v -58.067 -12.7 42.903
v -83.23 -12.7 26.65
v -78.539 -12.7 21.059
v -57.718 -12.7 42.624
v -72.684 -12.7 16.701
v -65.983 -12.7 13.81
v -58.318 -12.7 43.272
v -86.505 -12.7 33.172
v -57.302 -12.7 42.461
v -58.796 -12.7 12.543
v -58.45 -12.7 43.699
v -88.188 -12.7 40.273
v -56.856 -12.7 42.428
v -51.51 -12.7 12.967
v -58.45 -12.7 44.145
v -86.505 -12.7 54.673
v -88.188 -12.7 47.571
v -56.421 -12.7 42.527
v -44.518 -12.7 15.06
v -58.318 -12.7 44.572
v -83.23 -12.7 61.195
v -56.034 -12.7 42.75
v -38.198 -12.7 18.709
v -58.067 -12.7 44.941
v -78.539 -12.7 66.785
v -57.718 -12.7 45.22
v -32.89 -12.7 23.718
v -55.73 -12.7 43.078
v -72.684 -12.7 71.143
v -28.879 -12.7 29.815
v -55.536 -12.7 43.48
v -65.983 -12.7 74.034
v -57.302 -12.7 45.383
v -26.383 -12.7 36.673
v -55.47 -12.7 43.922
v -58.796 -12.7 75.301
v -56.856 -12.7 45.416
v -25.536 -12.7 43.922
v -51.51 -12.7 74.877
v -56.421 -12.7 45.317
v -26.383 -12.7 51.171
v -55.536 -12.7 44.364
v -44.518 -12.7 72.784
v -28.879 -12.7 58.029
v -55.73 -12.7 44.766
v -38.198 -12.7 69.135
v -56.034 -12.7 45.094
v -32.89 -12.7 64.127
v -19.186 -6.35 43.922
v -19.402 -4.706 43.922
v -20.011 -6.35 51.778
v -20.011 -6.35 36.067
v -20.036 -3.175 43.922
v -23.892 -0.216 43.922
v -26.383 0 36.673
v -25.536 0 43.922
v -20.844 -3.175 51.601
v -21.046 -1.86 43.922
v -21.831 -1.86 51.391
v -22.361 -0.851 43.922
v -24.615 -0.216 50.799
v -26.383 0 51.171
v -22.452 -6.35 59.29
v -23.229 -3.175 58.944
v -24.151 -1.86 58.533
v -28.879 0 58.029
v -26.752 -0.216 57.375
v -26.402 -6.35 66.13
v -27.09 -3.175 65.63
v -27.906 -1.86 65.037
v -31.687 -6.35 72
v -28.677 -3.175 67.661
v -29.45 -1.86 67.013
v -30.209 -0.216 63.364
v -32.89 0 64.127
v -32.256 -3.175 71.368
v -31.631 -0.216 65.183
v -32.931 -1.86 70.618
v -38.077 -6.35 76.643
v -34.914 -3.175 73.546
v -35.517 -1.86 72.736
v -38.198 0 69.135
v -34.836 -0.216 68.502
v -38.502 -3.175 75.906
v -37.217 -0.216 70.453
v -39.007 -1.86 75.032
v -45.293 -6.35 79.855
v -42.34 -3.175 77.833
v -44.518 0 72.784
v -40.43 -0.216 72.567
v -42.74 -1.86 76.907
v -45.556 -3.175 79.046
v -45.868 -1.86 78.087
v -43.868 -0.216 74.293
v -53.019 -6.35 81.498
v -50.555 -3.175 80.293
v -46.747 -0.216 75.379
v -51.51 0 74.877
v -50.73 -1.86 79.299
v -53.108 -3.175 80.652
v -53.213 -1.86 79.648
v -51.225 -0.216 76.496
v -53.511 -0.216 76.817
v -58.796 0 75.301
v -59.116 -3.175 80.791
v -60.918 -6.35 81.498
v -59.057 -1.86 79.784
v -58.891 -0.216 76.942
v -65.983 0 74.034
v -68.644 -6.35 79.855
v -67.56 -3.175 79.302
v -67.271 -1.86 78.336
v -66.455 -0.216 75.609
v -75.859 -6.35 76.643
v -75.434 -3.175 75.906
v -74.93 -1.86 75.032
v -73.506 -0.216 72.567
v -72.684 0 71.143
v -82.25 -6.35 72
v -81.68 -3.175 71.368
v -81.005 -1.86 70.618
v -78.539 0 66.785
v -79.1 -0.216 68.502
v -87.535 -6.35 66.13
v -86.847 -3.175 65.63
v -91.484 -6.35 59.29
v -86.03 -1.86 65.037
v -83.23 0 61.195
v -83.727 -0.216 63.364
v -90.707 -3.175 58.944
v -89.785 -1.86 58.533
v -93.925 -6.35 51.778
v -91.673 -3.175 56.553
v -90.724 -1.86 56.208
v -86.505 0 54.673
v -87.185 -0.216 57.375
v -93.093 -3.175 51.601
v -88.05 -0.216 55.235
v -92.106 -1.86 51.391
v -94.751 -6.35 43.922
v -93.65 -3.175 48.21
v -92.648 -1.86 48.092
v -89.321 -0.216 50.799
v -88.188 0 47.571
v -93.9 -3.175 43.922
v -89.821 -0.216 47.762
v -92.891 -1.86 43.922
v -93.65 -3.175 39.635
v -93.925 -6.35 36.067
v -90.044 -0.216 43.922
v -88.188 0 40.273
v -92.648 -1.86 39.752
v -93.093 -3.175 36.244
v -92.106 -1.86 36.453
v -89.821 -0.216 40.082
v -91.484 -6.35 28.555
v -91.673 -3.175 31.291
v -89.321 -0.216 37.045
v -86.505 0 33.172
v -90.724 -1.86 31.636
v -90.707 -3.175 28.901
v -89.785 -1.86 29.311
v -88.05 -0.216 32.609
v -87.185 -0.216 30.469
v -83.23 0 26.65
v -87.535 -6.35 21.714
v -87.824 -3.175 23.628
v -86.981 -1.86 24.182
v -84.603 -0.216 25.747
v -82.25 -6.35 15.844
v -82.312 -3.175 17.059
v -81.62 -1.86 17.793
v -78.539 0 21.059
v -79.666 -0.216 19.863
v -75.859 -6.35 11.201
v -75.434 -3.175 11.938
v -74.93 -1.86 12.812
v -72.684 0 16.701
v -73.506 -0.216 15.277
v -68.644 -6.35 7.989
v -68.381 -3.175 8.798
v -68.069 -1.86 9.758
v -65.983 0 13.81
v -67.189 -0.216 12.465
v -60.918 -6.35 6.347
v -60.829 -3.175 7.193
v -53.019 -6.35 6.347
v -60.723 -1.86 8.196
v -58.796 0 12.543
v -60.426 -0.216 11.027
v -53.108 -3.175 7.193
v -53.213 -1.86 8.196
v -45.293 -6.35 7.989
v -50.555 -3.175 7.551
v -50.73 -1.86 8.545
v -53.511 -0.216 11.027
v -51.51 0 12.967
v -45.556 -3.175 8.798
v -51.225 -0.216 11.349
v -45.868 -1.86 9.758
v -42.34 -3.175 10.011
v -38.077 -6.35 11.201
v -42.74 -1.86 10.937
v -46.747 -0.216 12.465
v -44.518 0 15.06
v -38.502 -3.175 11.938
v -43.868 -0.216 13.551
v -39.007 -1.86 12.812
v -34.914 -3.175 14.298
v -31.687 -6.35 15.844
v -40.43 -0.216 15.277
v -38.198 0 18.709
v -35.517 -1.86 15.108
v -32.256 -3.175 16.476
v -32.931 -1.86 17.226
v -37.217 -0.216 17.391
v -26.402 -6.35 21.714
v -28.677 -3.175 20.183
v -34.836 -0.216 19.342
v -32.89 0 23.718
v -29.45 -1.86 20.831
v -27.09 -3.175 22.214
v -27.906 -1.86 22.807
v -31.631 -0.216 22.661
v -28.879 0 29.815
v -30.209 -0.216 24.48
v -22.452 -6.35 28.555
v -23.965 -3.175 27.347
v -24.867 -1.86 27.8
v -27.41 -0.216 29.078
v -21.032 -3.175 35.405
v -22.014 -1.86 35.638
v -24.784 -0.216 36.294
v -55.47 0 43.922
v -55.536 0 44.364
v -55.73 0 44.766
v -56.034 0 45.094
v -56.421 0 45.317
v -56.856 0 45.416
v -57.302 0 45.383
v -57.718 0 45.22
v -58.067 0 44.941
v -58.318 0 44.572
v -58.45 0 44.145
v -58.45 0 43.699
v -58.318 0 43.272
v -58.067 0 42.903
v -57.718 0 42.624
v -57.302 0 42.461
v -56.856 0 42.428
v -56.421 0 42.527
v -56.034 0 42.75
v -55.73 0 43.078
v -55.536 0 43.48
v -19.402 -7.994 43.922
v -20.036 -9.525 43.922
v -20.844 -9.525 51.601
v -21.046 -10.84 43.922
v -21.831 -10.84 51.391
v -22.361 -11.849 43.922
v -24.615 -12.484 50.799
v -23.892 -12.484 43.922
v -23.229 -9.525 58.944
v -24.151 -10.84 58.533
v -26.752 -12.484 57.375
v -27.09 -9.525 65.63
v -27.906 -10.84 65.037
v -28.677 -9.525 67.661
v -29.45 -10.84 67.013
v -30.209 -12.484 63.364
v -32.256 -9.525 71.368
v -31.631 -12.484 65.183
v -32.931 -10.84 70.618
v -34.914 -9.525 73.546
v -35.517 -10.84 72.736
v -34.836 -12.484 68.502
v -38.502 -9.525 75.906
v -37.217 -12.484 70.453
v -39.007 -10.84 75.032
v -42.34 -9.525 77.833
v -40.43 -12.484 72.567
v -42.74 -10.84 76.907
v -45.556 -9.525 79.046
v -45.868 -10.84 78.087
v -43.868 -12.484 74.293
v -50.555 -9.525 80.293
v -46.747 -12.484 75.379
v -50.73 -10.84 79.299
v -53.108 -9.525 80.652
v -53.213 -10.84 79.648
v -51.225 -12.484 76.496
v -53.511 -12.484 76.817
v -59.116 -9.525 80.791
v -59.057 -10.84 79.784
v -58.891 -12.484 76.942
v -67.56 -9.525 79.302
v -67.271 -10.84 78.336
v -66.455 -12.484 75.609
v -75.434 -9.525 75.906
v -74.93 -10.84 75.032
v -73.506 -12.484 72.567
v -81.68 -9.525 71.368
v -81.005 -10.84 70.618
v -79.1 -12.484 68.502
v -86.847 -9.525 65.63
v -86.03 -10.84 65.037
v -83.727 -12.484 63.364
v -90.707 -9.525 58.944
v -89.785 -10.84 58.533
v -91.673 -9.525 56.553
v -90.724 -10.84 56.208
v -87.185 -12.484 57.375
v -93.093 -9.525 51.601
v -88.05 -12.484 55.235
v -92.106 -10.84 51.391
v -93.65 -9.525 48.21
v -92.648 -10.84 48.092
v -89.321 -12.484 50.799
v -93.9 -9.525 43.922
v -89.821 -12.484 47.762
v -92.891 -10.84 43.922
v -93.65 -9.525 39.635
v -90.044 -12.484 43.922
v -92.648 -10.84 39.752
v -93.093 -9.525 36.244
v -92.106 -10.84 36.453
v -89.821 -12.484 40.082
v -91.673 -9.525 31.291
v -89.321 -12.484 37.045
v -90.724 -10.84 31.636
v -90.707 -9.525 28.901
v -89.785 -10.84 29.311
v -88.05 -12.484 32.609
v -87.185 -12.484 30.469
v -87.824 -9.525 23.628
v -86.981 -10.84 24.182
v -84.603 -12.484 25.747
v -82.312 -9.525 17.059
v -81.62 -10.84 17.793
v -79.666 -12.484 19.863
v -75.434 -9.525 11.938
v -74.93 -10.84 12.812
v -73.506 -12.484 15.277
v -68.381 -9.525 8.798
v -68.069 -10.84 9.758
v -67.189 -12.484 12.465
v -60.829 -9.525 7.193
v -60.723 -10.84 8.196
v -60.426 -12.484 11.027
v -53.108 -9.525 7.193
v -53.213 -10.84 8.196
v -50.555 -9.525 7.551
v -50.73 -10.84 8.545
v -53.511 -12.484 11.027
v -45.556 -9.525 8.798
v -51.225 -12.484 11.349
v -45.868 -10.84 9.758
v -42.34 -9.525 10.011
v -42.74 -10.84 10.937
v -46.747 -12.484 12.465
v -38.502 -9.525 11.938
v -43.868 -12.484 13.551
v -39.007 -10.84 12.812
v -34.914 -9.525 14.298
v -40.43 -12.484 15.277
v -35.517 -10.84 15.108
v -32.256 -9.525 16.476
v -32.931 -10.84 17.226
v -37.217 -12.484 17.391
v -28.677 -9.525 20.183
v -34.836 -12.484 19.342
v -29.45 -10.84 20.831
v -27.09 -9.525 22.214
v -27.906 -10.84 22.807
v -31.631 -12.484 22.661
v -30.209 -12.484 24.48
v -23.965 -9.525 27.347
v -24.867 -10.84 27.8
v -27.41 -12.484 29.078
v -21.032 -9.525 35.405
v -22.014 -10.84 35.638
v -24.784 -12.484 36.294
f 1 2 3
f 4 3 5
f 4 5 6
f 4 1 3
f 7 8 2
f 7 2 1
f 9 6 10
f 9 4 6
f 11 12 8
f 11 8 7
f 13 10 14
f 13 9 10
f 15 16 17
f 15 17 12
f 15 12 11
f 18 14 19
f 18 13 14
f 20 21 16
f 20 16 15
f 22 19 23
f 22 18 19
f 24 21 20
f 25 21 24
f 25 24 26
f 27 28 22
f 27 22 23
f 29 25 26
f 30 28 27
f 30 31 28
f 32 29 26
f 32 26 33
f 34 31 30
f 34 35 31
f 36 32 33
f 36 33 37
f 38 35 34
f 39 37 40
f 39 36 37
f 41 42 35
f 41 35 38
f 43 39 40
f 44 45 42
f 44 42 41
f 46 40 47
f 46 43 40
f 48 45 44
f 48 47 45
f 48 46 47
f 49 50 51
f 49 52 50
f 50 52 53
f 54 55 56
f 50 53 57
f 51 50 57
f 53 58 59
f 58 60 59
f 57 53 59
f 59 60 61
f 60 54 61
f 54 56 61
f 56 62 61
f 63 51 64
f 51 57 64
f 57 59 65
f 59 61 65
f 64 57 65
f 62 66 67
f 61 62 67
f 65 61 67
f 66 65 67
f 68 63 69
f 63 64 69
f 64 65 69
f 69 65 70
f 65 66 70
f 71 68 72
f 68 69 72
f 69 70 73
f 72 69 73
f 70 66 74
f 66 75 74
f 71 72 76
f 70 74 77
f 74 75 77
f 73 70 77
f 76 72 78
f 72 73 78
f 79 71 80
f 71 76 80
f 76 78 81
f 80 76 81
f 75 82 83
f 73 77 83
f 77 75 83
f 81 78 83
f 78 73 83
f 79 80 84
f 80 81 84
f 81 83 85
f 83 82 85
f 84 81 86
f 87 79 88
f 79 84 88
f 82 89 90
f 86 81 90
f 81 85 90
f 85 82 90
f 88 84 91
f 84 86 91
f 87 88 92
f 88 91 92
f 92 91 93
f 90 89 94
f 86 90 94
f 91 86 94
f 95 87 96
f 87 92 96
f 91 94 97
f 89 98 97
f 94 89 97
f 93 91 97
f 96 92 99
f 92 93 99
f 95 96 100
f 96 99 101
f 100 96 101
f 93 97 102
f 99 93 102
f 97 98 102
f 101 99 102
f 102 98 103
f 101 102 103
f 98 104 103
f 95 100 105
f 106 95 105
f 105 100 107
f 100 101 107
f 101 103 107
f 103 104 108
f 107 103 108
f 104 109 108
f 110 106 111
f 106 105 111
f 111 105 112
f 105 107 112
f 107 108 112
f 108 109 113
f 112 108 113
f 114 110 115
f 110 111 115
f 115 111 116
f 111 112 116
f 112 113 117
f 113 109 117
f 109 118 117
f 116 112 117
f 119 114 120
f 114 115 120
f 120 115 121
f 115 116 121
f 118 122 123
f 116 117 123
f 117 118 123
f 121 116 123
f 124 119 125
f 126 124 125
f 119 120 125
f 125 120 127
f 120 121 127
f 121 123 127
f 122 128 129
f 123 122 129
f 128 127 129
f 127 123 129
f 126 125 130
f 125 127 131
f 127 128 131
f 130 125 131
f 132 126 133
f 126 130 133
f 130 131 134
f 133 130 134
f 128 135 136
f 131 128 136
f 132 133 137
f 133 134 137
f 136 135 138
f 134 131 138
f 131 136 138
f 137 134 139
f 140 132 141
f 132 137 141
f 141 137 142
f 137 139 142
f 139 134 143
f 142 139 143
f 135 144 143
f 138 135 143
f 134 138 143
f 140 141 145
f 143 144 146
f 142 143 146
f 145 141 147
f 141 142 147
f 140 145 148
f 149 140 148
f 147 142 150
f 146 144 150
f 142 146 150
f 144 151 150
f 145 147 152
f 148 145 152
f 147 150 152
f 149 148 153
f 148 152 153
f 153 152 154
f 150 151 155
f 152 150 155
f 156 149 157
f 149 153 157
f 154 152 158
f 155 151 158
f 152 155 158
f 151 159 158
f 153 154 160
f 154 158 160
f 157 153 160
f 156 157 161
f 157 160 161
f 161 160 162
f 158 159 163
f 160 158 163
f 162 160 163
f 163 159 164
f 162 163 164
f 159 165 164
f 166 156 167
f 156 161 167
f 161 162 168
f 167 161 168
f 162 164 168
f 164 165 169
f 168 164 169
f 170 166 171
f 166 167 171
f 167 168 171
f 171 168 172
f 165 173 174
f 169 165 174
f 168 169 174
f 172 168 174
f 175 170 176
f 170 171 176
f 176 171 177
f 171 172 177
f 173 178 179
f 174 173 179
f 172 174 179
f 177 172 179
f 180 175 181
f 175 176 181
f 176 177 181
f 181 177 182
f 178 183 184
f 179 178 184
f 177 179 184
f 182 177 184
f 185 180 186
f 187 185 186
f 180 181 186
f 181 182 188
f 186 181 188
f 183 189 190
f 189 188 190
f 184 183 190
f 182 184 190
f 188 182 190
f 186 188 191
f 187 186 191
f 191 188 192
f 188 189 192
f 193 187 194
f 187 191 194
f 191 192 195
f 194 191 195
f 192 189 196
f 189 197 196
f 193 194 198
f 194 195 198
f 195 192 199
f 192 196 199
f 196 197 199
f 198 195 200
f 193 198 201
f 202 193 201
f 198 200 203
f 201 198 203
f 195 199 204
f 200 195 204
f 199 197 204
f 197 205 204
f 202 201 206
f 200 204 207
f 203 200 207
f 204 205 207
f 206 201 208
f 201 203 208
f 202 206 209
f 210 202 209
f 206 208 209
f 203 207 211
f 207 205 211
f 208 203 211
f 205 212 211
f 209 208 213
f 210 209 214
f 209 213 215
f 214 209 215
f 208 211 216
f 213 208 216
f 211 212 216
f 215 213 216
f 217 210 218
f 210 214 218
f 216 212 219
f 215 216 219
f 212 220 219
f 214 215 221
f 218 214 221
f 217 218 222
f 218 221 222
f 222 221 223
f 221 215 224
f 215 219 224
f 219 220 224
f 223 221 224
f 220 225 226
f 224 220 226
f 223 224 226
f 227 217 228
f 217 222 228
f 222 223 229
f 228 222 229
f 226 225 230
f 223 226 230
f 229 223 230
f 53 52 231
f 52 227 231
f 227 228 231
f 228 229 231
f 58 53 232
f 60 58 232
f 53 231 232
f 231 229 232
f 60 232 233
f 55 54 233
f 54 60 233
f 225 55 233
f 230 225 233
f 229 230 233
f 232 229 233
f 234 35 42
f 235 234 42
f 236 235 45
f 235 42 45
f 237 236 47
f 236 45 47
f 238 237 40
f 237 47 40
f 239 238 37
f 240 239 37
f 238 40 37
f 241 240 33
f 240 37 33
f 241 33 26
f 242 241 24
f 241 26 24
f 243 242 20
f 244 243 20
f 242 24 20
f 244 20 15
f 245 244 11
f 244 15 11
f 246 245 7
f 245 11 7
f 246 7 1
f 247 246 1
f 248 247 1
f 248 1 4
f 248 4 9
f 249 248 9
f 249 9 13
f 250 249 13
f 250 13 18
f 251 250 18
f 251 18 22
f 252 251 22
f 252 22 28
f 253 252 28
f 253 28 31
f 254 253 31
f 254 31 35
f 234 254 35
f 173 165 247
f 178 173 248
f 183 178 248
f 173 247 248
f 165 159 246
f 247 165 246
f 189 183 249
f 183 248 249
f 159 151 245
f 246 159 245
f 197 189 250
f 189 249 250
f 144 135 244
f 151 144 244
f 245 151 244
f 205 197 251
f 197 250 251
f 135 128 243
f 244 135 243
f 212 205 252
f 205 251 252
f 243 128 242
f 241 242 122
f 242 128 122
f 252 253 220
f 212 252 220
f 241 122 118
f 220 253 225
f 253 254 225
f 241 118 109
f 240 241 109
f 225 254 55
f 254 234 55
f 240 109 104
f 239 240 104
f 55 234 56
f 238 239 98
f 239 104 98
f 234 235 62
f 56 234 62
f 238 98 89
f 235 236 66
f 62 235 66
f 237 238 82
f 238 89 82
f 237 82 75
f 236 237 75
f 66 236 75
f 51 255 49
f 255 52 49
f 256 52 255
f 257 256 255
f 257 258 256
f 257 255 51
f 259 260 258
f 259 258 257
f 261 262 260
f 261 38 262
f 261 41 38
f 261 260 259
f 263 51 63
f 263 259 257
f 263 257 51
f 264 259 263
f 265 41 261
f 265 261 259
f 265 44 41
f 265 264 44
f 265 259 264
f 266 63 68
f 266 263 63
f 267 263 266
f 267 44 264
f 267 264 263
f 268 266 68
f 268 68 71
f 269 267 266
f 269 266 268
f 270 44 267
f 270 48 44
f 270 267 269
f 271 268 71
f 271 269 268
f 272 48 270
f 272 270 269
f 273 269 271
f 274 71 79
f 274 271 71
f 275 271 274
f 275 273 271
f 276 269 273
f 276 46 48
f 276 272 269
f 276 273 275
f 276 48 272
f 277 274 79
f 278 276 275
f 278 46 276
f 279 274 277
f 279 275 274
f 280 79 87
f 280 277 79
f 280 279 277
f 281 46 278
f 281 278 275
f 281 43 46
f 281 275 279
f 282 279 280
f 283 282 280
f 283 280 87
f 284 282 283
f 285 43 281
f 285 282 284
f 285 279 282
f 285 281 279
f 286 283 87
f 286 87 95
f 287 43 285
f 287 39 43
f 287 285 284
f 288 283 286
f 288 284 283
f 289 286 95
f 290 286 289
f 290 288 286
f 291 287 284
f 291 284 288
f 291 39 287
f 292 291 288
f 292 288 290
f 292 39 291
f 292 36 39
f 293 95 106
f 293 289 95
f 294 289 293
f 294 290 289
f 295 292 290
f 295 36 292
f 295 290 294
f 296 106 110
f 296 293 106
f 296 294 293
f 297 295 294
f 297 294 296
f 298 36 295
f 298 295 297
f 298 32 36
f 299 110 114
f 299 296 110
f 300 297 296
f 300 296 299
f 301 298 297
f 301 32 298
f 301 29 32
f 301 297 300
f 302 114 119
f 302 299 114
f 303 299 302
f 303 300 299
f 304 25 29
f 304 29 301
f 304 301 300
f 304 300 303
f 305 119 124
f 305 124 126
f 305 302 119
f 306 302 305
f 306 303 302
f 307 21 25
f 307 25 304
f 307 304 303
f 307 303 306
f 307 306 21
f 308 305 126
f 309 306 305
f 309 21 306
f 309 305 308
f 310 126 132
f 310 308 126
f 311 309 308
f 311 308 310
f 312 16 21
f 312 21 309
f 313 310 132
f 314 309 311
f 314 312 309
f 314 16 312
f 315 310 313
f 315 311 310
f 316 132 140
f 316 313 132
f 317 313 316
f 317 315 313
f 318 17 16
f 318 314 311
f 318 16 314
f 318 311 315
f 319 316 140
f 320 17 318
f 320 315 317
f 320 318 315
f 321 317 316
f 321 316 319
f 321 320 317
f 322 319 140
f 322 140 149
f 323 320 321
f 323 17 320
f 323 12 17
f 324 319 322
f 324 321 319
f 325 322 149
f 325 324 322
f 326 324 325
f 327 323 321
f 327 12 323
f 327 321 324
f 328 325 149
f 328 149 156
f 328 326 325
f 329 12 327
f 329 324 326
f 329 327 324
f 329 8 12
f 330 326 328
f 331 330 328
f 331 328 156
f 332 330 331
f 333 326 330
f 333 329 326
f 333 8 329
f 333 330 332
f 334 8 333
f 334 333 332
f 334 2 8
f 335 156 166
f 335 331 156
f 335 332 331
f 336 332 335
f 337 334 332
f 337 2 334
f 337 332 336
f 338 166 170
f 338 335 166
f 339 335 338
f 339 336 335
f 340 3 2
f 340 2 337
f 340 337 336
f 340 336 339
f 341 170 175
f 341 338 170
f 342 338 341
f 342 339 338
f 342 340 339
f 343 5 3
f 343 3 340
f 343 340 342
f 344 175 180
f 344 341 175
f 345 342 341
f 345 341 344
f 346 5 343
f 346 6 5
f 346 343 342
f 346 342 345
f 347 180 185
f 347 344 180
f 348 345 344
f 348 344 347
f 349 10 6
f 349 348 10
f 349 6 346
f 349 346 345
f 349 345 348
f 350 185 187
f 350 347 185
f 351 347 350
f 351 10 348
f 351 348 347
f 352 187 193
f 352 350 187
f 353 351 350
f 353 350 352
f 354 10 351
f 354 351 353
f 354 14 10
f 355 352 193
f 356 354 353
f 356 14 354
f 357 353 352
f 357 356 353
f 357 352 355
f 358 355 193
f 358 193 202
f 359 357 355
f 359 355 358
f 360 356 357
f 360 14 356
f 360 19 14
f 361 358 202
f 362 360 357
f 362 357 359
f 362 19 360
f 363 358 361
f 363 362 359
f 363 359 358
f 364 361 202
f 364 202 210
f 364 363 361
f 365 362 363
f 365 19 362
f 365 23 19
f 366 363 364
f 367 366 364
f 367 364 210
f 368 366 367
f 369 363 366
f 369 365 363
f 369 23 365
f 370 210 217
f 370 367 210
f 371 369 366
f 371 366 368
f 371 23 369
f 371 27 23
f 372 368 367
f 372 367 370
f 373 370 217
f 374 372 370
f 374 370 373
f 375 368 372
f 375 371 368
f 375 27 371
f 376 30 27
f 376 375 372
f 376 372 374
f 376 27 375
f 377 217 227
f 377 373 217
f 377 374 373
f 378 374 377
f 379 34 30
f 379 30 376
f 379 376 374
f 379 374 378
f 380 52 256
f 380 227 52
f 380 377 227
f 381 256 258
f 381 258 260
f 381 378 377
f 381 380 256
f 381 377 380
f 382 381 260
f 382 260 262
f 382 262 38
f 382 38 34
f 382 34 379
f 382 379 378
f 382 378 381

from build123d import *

# Parameters (mm, degrees)
F0_R     = 37.7825
F1_DEPTH = 12.7
F2_R     = 6.35
F3_R     = 6.34999
F4_R     = 1.4986
F5_DEPTH = 12.701


# Not quite as in the source:
# - a fillet or chamfer is up to 0.001 mm smaller than in the source, because OpenCascade refuses the exact size


with BuildPart() as f1:
    # F0 (on Front) → F1 (new body)
    with BuildSketch(Plane.XZ):
        with Locations((-56.96824193, 43.9220815897)):
            Circle(F0_R)
    extrude(amount=F1_DEPTH)

    # F2
    f2_edges = [f1.edges().sort_by_distance(p)[0] for p in [
        (-94.750742, -12.7, 43.922082),
    ]]
    fillet(f2_edges, radius=F2_R)

    # F3 (radius 6.35 in the source; OpenCascade refuses exactly that, so slightly less here)
    f3_edges = [f1.edges().sort_by_distance(p)[0] for p in [
        (-94.750742, 0, 43.922082),
    ]]
    fillet(f3_edges, radius=F3_R)

    # F4 (on face) → F5 (cut, through all)
    with BuildSketch(Plane.XZ.offset(12.7)):
        with Locations((-56.96824193, 43.9220815897)):
            Circle(F4_R)
    extrude(amount=-F5_DEPTH, mode=Mode.SUBTRACT)


solid = f1.part
